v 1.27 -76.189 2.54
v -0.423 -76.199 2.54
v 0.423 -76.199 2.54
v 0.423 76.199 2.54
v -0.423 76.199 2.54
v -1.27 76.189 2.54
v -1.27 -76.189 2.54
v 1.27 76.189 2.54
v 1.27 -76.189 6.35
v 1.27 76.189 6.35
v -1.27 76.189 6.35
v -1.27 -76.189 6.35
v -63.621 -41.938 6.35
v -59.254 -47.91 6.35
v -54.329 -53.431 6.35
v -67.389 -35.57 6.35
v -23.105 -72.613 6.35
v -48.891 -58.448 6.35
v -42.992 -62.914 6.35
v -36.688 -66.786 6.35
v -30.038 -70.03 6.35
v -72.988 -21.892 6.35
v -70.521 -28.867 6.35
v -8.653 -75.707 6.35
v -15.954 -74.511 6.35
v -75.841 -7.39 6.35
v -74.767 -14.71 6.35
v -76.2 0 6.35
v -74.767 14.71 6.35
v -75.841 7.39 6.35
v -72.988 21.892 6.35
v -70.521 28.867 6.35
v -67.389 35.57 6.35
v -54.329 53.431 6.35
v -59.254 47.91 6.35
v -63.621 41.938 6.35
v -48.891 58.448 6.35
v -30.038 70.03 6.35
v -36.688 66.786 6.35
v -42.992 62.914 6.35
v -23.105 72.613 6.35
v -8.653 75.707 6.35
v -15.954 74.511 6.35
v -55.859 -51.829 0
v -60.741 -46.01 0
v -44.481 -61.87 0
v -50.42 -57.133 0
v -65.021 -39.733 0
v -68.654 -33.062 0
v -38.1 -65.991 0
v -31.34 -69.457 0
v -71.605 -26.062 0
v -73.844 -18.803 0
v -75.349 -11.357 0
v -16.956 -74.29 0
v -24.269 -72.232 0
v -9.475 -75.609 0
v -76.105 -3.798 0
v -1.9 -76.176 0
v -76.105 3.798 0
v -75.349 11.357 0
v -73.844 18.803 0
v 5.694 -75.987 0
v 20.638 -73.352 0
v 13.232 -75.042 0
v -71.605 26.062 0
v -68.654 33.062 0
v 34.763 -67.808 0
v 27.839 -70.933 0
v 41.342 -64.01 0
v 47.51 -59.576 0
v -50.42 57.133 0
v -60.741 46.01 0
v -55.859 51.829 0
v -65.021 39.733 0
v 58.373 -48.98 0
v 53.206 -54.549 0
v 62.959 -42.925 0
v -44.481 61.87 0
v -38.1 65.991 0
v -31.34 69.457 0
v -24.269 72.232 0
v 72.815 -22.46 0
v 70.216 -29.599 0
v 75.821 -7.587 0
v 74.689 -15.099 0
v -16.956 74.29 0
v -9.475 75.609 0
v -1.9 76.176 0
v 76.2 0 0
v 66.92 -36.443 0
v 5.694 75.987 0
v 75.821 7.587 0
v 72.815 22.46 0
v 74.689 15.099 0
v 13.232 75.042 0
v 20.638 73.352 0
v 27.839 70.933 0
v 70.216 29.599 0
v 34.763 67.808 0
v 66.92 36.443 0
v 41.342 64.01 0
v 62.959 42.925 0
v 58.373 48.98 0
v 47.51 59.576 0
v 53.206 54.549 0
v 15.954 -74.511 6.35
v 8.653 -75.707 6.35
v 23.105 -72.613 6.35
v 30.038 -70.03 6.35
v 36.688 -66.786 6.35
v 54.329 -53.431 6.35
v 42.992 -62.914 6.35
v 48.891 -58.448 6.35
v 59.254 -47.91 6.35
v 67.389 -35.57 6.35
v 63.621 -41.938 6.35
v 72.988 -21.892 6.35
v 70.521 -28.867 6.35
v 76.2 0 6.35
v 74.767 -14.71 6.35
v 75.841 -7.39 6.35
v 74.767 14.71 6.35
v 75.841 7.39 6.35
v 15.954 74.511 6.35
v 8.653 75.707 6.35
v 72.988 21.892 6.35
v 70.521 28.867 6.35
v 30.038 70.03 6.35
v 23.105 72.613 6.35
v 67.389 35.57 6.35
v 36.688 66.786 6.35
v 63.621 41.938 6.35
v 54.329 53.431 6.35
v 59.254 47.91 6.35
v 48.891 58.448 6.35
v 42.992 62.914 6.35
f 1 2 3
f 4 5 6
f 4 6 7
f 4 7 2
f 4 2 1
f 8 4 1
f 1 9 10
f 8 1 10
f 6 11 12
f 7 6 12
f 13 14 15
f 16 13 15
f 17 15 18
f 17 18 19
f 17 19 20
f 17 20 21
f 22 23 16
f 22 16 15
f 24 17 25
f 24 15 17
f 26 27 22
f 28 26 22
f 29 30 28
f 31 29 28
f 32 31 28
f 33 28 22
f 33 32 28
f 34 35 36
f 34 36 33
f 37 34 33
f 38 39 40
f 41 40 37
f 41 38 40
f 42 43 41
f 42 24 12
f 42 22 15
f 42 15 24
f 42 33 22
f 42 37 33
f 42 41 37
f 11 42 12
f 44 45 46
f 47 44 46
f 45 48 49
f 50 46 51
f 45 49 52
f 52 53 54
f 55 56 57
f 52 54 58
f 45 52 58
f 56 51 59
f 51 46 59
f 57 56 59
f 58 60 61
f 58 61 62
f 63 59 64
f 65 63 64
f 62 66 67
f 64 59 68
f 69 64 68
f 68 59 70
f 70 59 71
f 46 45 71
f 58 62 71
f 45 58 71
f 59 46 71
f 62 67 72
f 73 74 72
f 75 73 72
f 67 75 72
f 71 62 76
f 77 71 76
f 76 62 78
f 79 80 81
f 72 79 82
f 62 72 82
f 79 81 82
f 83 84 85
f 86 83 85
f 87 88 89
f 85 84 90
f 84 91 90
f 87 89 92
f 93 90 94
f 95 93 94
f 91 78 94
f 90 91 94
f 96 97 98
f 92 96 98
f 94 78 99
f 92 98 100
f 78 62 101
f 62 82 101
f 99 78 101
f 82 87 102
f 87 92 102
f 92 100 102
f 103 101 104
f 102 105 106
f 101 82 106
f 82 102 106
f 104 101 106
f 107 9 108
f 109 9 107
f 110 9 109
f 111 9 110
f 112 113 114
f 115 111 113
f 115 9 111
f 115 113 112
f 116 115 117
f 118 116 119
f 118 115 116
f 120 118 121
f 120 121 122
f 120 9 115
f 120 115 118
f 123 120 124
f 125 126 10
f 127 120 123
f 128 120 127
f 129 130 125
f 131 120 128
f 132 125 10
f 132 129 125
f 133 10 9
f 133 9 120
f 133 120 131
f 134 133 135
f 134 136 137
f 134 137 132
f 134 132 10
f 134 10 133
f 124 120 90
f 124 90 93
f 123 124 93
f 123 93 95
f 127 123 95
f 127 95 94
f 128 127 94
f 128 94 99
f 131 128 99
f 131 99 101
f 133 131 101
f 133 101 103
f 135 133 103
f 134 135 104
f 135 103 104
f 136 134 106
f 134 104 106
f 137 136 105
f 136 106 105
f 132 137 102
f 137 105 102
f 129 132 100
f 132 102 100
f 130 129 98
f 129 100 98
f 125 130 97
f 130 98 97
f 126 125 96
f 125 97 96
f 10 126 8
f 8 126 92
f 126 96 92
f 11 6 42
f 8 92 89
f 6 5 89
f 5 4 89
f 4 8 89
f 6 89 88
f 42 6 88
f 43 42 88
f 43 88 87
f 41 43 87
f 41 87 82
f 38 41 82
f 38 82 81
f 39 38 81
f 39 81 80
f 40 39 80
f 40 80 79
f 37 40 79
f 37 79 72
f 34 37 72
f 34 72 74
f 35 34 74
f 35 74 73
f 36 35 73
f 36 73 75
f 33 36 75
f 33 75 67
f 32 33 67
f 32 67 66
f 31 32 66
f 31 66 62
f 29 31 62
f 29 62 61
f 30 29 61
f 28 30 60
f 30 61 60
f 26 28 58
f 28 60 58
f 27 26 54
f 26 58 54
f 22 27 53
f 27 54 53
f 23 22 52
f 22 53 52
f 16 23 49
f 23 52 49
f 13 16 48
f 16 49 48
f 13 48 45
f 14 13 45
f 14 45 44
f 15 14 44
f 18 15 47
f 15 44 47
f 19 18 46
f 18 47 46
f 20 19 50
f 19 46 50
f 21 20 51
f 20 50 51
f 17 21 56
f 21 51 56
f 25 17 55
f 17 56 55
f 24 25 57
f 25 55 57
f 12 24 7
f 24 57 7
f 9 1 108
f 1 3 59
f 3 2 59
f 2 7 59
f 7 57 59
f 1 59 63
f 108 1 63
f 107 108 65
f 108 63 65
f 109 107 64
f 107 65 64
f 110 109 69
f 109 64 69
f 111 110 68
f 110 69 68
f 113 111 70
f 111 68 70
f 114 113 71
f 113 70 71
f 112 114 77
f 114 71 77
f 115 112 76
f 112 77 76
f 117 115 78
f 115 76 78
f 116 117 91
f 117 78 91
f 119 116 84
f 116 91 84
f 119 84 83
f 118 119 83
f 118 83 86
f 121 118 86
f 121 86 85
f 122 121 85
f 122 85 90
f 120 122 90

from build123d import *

# Parameters (mm, degrees)
F0_R     = 76.2
F1_DEPTH = 6.35
F3_DEPTH = 3.81


with BuildPart() as f1:
    # F0 (on Top) → F1 (new body)
    with BuildSketch(Plane.XY):
        Circle(F0_R)
    extrude(amount=F1_DEPTH)

    # F2 (on face) → F3 (cut)
    with BuildSketch(Plane.XY.offset(6.35)):
        with BuildLine():
            Line((0, 76.2), (-1.27, 76.2))
            Line((-1.27, 76.2), (-1.27, 76.1894159316))
            ThreePointArc((-1.27, 76.1894159316), (-0.6350220513, 76.197353937), (0, 76.2))
        make_face()
        with BuildLine():
            Line((1.27, 76.2), (0, 76.2))
            ThreePointArc((0, 76.2), (0.6350220513, 76.197353937), (1.27, 76.1894159316))
            Line((1.27, 76.1894159316), (1.27, 76.2))
        make_face()
        with BuildLine():
            ThreePointArc((0, -76.2), (-0.6350220513, -76.197353937), (-1.27, -76.1894159316))
            Line((-1.27, -76.1894159316), (-1.27, -76.2))
            Line((-1.27, -76.2), (0, -76.2))
        make_face()
        with BuildLine():
            Line((1.27, -76.2), (1.27, -76.1894159316))
            ThreePointArc((1.27, -76.1894159316), (0.6350220513, -76.197353937), (0, -76.2))
            Line((0, -76.2), (1.27, -76.2))
        make_face()
        with BuildLine():
            ThreePointArc((1.27, 76.1894159316), (0.6350220513, 76.197353937), (0, 76.2))
            ThreePointArc((0, 76.2), (-0.6350220513, 76.197353937), (-1.27, 76.1894159316))
            Line((-1.27, 76.1894159316), (-1.27, -76.1894159316))
            ThreePointArc((-1.27, -76.1894159316), (-0.6350220513, -76.197353937), (0, -76.2))
            ThreePointArc((0, -76.2), (0.6350220513, -76.197353937), (1.27, -76.1894159316))
            Line((1.27, -76.1894159316), (1.27, 76.1894159316))
        make_face()
    extrude(amount=-F3_DEPTH, mode=Mode.SUBTRACT)


solid = f1.part
